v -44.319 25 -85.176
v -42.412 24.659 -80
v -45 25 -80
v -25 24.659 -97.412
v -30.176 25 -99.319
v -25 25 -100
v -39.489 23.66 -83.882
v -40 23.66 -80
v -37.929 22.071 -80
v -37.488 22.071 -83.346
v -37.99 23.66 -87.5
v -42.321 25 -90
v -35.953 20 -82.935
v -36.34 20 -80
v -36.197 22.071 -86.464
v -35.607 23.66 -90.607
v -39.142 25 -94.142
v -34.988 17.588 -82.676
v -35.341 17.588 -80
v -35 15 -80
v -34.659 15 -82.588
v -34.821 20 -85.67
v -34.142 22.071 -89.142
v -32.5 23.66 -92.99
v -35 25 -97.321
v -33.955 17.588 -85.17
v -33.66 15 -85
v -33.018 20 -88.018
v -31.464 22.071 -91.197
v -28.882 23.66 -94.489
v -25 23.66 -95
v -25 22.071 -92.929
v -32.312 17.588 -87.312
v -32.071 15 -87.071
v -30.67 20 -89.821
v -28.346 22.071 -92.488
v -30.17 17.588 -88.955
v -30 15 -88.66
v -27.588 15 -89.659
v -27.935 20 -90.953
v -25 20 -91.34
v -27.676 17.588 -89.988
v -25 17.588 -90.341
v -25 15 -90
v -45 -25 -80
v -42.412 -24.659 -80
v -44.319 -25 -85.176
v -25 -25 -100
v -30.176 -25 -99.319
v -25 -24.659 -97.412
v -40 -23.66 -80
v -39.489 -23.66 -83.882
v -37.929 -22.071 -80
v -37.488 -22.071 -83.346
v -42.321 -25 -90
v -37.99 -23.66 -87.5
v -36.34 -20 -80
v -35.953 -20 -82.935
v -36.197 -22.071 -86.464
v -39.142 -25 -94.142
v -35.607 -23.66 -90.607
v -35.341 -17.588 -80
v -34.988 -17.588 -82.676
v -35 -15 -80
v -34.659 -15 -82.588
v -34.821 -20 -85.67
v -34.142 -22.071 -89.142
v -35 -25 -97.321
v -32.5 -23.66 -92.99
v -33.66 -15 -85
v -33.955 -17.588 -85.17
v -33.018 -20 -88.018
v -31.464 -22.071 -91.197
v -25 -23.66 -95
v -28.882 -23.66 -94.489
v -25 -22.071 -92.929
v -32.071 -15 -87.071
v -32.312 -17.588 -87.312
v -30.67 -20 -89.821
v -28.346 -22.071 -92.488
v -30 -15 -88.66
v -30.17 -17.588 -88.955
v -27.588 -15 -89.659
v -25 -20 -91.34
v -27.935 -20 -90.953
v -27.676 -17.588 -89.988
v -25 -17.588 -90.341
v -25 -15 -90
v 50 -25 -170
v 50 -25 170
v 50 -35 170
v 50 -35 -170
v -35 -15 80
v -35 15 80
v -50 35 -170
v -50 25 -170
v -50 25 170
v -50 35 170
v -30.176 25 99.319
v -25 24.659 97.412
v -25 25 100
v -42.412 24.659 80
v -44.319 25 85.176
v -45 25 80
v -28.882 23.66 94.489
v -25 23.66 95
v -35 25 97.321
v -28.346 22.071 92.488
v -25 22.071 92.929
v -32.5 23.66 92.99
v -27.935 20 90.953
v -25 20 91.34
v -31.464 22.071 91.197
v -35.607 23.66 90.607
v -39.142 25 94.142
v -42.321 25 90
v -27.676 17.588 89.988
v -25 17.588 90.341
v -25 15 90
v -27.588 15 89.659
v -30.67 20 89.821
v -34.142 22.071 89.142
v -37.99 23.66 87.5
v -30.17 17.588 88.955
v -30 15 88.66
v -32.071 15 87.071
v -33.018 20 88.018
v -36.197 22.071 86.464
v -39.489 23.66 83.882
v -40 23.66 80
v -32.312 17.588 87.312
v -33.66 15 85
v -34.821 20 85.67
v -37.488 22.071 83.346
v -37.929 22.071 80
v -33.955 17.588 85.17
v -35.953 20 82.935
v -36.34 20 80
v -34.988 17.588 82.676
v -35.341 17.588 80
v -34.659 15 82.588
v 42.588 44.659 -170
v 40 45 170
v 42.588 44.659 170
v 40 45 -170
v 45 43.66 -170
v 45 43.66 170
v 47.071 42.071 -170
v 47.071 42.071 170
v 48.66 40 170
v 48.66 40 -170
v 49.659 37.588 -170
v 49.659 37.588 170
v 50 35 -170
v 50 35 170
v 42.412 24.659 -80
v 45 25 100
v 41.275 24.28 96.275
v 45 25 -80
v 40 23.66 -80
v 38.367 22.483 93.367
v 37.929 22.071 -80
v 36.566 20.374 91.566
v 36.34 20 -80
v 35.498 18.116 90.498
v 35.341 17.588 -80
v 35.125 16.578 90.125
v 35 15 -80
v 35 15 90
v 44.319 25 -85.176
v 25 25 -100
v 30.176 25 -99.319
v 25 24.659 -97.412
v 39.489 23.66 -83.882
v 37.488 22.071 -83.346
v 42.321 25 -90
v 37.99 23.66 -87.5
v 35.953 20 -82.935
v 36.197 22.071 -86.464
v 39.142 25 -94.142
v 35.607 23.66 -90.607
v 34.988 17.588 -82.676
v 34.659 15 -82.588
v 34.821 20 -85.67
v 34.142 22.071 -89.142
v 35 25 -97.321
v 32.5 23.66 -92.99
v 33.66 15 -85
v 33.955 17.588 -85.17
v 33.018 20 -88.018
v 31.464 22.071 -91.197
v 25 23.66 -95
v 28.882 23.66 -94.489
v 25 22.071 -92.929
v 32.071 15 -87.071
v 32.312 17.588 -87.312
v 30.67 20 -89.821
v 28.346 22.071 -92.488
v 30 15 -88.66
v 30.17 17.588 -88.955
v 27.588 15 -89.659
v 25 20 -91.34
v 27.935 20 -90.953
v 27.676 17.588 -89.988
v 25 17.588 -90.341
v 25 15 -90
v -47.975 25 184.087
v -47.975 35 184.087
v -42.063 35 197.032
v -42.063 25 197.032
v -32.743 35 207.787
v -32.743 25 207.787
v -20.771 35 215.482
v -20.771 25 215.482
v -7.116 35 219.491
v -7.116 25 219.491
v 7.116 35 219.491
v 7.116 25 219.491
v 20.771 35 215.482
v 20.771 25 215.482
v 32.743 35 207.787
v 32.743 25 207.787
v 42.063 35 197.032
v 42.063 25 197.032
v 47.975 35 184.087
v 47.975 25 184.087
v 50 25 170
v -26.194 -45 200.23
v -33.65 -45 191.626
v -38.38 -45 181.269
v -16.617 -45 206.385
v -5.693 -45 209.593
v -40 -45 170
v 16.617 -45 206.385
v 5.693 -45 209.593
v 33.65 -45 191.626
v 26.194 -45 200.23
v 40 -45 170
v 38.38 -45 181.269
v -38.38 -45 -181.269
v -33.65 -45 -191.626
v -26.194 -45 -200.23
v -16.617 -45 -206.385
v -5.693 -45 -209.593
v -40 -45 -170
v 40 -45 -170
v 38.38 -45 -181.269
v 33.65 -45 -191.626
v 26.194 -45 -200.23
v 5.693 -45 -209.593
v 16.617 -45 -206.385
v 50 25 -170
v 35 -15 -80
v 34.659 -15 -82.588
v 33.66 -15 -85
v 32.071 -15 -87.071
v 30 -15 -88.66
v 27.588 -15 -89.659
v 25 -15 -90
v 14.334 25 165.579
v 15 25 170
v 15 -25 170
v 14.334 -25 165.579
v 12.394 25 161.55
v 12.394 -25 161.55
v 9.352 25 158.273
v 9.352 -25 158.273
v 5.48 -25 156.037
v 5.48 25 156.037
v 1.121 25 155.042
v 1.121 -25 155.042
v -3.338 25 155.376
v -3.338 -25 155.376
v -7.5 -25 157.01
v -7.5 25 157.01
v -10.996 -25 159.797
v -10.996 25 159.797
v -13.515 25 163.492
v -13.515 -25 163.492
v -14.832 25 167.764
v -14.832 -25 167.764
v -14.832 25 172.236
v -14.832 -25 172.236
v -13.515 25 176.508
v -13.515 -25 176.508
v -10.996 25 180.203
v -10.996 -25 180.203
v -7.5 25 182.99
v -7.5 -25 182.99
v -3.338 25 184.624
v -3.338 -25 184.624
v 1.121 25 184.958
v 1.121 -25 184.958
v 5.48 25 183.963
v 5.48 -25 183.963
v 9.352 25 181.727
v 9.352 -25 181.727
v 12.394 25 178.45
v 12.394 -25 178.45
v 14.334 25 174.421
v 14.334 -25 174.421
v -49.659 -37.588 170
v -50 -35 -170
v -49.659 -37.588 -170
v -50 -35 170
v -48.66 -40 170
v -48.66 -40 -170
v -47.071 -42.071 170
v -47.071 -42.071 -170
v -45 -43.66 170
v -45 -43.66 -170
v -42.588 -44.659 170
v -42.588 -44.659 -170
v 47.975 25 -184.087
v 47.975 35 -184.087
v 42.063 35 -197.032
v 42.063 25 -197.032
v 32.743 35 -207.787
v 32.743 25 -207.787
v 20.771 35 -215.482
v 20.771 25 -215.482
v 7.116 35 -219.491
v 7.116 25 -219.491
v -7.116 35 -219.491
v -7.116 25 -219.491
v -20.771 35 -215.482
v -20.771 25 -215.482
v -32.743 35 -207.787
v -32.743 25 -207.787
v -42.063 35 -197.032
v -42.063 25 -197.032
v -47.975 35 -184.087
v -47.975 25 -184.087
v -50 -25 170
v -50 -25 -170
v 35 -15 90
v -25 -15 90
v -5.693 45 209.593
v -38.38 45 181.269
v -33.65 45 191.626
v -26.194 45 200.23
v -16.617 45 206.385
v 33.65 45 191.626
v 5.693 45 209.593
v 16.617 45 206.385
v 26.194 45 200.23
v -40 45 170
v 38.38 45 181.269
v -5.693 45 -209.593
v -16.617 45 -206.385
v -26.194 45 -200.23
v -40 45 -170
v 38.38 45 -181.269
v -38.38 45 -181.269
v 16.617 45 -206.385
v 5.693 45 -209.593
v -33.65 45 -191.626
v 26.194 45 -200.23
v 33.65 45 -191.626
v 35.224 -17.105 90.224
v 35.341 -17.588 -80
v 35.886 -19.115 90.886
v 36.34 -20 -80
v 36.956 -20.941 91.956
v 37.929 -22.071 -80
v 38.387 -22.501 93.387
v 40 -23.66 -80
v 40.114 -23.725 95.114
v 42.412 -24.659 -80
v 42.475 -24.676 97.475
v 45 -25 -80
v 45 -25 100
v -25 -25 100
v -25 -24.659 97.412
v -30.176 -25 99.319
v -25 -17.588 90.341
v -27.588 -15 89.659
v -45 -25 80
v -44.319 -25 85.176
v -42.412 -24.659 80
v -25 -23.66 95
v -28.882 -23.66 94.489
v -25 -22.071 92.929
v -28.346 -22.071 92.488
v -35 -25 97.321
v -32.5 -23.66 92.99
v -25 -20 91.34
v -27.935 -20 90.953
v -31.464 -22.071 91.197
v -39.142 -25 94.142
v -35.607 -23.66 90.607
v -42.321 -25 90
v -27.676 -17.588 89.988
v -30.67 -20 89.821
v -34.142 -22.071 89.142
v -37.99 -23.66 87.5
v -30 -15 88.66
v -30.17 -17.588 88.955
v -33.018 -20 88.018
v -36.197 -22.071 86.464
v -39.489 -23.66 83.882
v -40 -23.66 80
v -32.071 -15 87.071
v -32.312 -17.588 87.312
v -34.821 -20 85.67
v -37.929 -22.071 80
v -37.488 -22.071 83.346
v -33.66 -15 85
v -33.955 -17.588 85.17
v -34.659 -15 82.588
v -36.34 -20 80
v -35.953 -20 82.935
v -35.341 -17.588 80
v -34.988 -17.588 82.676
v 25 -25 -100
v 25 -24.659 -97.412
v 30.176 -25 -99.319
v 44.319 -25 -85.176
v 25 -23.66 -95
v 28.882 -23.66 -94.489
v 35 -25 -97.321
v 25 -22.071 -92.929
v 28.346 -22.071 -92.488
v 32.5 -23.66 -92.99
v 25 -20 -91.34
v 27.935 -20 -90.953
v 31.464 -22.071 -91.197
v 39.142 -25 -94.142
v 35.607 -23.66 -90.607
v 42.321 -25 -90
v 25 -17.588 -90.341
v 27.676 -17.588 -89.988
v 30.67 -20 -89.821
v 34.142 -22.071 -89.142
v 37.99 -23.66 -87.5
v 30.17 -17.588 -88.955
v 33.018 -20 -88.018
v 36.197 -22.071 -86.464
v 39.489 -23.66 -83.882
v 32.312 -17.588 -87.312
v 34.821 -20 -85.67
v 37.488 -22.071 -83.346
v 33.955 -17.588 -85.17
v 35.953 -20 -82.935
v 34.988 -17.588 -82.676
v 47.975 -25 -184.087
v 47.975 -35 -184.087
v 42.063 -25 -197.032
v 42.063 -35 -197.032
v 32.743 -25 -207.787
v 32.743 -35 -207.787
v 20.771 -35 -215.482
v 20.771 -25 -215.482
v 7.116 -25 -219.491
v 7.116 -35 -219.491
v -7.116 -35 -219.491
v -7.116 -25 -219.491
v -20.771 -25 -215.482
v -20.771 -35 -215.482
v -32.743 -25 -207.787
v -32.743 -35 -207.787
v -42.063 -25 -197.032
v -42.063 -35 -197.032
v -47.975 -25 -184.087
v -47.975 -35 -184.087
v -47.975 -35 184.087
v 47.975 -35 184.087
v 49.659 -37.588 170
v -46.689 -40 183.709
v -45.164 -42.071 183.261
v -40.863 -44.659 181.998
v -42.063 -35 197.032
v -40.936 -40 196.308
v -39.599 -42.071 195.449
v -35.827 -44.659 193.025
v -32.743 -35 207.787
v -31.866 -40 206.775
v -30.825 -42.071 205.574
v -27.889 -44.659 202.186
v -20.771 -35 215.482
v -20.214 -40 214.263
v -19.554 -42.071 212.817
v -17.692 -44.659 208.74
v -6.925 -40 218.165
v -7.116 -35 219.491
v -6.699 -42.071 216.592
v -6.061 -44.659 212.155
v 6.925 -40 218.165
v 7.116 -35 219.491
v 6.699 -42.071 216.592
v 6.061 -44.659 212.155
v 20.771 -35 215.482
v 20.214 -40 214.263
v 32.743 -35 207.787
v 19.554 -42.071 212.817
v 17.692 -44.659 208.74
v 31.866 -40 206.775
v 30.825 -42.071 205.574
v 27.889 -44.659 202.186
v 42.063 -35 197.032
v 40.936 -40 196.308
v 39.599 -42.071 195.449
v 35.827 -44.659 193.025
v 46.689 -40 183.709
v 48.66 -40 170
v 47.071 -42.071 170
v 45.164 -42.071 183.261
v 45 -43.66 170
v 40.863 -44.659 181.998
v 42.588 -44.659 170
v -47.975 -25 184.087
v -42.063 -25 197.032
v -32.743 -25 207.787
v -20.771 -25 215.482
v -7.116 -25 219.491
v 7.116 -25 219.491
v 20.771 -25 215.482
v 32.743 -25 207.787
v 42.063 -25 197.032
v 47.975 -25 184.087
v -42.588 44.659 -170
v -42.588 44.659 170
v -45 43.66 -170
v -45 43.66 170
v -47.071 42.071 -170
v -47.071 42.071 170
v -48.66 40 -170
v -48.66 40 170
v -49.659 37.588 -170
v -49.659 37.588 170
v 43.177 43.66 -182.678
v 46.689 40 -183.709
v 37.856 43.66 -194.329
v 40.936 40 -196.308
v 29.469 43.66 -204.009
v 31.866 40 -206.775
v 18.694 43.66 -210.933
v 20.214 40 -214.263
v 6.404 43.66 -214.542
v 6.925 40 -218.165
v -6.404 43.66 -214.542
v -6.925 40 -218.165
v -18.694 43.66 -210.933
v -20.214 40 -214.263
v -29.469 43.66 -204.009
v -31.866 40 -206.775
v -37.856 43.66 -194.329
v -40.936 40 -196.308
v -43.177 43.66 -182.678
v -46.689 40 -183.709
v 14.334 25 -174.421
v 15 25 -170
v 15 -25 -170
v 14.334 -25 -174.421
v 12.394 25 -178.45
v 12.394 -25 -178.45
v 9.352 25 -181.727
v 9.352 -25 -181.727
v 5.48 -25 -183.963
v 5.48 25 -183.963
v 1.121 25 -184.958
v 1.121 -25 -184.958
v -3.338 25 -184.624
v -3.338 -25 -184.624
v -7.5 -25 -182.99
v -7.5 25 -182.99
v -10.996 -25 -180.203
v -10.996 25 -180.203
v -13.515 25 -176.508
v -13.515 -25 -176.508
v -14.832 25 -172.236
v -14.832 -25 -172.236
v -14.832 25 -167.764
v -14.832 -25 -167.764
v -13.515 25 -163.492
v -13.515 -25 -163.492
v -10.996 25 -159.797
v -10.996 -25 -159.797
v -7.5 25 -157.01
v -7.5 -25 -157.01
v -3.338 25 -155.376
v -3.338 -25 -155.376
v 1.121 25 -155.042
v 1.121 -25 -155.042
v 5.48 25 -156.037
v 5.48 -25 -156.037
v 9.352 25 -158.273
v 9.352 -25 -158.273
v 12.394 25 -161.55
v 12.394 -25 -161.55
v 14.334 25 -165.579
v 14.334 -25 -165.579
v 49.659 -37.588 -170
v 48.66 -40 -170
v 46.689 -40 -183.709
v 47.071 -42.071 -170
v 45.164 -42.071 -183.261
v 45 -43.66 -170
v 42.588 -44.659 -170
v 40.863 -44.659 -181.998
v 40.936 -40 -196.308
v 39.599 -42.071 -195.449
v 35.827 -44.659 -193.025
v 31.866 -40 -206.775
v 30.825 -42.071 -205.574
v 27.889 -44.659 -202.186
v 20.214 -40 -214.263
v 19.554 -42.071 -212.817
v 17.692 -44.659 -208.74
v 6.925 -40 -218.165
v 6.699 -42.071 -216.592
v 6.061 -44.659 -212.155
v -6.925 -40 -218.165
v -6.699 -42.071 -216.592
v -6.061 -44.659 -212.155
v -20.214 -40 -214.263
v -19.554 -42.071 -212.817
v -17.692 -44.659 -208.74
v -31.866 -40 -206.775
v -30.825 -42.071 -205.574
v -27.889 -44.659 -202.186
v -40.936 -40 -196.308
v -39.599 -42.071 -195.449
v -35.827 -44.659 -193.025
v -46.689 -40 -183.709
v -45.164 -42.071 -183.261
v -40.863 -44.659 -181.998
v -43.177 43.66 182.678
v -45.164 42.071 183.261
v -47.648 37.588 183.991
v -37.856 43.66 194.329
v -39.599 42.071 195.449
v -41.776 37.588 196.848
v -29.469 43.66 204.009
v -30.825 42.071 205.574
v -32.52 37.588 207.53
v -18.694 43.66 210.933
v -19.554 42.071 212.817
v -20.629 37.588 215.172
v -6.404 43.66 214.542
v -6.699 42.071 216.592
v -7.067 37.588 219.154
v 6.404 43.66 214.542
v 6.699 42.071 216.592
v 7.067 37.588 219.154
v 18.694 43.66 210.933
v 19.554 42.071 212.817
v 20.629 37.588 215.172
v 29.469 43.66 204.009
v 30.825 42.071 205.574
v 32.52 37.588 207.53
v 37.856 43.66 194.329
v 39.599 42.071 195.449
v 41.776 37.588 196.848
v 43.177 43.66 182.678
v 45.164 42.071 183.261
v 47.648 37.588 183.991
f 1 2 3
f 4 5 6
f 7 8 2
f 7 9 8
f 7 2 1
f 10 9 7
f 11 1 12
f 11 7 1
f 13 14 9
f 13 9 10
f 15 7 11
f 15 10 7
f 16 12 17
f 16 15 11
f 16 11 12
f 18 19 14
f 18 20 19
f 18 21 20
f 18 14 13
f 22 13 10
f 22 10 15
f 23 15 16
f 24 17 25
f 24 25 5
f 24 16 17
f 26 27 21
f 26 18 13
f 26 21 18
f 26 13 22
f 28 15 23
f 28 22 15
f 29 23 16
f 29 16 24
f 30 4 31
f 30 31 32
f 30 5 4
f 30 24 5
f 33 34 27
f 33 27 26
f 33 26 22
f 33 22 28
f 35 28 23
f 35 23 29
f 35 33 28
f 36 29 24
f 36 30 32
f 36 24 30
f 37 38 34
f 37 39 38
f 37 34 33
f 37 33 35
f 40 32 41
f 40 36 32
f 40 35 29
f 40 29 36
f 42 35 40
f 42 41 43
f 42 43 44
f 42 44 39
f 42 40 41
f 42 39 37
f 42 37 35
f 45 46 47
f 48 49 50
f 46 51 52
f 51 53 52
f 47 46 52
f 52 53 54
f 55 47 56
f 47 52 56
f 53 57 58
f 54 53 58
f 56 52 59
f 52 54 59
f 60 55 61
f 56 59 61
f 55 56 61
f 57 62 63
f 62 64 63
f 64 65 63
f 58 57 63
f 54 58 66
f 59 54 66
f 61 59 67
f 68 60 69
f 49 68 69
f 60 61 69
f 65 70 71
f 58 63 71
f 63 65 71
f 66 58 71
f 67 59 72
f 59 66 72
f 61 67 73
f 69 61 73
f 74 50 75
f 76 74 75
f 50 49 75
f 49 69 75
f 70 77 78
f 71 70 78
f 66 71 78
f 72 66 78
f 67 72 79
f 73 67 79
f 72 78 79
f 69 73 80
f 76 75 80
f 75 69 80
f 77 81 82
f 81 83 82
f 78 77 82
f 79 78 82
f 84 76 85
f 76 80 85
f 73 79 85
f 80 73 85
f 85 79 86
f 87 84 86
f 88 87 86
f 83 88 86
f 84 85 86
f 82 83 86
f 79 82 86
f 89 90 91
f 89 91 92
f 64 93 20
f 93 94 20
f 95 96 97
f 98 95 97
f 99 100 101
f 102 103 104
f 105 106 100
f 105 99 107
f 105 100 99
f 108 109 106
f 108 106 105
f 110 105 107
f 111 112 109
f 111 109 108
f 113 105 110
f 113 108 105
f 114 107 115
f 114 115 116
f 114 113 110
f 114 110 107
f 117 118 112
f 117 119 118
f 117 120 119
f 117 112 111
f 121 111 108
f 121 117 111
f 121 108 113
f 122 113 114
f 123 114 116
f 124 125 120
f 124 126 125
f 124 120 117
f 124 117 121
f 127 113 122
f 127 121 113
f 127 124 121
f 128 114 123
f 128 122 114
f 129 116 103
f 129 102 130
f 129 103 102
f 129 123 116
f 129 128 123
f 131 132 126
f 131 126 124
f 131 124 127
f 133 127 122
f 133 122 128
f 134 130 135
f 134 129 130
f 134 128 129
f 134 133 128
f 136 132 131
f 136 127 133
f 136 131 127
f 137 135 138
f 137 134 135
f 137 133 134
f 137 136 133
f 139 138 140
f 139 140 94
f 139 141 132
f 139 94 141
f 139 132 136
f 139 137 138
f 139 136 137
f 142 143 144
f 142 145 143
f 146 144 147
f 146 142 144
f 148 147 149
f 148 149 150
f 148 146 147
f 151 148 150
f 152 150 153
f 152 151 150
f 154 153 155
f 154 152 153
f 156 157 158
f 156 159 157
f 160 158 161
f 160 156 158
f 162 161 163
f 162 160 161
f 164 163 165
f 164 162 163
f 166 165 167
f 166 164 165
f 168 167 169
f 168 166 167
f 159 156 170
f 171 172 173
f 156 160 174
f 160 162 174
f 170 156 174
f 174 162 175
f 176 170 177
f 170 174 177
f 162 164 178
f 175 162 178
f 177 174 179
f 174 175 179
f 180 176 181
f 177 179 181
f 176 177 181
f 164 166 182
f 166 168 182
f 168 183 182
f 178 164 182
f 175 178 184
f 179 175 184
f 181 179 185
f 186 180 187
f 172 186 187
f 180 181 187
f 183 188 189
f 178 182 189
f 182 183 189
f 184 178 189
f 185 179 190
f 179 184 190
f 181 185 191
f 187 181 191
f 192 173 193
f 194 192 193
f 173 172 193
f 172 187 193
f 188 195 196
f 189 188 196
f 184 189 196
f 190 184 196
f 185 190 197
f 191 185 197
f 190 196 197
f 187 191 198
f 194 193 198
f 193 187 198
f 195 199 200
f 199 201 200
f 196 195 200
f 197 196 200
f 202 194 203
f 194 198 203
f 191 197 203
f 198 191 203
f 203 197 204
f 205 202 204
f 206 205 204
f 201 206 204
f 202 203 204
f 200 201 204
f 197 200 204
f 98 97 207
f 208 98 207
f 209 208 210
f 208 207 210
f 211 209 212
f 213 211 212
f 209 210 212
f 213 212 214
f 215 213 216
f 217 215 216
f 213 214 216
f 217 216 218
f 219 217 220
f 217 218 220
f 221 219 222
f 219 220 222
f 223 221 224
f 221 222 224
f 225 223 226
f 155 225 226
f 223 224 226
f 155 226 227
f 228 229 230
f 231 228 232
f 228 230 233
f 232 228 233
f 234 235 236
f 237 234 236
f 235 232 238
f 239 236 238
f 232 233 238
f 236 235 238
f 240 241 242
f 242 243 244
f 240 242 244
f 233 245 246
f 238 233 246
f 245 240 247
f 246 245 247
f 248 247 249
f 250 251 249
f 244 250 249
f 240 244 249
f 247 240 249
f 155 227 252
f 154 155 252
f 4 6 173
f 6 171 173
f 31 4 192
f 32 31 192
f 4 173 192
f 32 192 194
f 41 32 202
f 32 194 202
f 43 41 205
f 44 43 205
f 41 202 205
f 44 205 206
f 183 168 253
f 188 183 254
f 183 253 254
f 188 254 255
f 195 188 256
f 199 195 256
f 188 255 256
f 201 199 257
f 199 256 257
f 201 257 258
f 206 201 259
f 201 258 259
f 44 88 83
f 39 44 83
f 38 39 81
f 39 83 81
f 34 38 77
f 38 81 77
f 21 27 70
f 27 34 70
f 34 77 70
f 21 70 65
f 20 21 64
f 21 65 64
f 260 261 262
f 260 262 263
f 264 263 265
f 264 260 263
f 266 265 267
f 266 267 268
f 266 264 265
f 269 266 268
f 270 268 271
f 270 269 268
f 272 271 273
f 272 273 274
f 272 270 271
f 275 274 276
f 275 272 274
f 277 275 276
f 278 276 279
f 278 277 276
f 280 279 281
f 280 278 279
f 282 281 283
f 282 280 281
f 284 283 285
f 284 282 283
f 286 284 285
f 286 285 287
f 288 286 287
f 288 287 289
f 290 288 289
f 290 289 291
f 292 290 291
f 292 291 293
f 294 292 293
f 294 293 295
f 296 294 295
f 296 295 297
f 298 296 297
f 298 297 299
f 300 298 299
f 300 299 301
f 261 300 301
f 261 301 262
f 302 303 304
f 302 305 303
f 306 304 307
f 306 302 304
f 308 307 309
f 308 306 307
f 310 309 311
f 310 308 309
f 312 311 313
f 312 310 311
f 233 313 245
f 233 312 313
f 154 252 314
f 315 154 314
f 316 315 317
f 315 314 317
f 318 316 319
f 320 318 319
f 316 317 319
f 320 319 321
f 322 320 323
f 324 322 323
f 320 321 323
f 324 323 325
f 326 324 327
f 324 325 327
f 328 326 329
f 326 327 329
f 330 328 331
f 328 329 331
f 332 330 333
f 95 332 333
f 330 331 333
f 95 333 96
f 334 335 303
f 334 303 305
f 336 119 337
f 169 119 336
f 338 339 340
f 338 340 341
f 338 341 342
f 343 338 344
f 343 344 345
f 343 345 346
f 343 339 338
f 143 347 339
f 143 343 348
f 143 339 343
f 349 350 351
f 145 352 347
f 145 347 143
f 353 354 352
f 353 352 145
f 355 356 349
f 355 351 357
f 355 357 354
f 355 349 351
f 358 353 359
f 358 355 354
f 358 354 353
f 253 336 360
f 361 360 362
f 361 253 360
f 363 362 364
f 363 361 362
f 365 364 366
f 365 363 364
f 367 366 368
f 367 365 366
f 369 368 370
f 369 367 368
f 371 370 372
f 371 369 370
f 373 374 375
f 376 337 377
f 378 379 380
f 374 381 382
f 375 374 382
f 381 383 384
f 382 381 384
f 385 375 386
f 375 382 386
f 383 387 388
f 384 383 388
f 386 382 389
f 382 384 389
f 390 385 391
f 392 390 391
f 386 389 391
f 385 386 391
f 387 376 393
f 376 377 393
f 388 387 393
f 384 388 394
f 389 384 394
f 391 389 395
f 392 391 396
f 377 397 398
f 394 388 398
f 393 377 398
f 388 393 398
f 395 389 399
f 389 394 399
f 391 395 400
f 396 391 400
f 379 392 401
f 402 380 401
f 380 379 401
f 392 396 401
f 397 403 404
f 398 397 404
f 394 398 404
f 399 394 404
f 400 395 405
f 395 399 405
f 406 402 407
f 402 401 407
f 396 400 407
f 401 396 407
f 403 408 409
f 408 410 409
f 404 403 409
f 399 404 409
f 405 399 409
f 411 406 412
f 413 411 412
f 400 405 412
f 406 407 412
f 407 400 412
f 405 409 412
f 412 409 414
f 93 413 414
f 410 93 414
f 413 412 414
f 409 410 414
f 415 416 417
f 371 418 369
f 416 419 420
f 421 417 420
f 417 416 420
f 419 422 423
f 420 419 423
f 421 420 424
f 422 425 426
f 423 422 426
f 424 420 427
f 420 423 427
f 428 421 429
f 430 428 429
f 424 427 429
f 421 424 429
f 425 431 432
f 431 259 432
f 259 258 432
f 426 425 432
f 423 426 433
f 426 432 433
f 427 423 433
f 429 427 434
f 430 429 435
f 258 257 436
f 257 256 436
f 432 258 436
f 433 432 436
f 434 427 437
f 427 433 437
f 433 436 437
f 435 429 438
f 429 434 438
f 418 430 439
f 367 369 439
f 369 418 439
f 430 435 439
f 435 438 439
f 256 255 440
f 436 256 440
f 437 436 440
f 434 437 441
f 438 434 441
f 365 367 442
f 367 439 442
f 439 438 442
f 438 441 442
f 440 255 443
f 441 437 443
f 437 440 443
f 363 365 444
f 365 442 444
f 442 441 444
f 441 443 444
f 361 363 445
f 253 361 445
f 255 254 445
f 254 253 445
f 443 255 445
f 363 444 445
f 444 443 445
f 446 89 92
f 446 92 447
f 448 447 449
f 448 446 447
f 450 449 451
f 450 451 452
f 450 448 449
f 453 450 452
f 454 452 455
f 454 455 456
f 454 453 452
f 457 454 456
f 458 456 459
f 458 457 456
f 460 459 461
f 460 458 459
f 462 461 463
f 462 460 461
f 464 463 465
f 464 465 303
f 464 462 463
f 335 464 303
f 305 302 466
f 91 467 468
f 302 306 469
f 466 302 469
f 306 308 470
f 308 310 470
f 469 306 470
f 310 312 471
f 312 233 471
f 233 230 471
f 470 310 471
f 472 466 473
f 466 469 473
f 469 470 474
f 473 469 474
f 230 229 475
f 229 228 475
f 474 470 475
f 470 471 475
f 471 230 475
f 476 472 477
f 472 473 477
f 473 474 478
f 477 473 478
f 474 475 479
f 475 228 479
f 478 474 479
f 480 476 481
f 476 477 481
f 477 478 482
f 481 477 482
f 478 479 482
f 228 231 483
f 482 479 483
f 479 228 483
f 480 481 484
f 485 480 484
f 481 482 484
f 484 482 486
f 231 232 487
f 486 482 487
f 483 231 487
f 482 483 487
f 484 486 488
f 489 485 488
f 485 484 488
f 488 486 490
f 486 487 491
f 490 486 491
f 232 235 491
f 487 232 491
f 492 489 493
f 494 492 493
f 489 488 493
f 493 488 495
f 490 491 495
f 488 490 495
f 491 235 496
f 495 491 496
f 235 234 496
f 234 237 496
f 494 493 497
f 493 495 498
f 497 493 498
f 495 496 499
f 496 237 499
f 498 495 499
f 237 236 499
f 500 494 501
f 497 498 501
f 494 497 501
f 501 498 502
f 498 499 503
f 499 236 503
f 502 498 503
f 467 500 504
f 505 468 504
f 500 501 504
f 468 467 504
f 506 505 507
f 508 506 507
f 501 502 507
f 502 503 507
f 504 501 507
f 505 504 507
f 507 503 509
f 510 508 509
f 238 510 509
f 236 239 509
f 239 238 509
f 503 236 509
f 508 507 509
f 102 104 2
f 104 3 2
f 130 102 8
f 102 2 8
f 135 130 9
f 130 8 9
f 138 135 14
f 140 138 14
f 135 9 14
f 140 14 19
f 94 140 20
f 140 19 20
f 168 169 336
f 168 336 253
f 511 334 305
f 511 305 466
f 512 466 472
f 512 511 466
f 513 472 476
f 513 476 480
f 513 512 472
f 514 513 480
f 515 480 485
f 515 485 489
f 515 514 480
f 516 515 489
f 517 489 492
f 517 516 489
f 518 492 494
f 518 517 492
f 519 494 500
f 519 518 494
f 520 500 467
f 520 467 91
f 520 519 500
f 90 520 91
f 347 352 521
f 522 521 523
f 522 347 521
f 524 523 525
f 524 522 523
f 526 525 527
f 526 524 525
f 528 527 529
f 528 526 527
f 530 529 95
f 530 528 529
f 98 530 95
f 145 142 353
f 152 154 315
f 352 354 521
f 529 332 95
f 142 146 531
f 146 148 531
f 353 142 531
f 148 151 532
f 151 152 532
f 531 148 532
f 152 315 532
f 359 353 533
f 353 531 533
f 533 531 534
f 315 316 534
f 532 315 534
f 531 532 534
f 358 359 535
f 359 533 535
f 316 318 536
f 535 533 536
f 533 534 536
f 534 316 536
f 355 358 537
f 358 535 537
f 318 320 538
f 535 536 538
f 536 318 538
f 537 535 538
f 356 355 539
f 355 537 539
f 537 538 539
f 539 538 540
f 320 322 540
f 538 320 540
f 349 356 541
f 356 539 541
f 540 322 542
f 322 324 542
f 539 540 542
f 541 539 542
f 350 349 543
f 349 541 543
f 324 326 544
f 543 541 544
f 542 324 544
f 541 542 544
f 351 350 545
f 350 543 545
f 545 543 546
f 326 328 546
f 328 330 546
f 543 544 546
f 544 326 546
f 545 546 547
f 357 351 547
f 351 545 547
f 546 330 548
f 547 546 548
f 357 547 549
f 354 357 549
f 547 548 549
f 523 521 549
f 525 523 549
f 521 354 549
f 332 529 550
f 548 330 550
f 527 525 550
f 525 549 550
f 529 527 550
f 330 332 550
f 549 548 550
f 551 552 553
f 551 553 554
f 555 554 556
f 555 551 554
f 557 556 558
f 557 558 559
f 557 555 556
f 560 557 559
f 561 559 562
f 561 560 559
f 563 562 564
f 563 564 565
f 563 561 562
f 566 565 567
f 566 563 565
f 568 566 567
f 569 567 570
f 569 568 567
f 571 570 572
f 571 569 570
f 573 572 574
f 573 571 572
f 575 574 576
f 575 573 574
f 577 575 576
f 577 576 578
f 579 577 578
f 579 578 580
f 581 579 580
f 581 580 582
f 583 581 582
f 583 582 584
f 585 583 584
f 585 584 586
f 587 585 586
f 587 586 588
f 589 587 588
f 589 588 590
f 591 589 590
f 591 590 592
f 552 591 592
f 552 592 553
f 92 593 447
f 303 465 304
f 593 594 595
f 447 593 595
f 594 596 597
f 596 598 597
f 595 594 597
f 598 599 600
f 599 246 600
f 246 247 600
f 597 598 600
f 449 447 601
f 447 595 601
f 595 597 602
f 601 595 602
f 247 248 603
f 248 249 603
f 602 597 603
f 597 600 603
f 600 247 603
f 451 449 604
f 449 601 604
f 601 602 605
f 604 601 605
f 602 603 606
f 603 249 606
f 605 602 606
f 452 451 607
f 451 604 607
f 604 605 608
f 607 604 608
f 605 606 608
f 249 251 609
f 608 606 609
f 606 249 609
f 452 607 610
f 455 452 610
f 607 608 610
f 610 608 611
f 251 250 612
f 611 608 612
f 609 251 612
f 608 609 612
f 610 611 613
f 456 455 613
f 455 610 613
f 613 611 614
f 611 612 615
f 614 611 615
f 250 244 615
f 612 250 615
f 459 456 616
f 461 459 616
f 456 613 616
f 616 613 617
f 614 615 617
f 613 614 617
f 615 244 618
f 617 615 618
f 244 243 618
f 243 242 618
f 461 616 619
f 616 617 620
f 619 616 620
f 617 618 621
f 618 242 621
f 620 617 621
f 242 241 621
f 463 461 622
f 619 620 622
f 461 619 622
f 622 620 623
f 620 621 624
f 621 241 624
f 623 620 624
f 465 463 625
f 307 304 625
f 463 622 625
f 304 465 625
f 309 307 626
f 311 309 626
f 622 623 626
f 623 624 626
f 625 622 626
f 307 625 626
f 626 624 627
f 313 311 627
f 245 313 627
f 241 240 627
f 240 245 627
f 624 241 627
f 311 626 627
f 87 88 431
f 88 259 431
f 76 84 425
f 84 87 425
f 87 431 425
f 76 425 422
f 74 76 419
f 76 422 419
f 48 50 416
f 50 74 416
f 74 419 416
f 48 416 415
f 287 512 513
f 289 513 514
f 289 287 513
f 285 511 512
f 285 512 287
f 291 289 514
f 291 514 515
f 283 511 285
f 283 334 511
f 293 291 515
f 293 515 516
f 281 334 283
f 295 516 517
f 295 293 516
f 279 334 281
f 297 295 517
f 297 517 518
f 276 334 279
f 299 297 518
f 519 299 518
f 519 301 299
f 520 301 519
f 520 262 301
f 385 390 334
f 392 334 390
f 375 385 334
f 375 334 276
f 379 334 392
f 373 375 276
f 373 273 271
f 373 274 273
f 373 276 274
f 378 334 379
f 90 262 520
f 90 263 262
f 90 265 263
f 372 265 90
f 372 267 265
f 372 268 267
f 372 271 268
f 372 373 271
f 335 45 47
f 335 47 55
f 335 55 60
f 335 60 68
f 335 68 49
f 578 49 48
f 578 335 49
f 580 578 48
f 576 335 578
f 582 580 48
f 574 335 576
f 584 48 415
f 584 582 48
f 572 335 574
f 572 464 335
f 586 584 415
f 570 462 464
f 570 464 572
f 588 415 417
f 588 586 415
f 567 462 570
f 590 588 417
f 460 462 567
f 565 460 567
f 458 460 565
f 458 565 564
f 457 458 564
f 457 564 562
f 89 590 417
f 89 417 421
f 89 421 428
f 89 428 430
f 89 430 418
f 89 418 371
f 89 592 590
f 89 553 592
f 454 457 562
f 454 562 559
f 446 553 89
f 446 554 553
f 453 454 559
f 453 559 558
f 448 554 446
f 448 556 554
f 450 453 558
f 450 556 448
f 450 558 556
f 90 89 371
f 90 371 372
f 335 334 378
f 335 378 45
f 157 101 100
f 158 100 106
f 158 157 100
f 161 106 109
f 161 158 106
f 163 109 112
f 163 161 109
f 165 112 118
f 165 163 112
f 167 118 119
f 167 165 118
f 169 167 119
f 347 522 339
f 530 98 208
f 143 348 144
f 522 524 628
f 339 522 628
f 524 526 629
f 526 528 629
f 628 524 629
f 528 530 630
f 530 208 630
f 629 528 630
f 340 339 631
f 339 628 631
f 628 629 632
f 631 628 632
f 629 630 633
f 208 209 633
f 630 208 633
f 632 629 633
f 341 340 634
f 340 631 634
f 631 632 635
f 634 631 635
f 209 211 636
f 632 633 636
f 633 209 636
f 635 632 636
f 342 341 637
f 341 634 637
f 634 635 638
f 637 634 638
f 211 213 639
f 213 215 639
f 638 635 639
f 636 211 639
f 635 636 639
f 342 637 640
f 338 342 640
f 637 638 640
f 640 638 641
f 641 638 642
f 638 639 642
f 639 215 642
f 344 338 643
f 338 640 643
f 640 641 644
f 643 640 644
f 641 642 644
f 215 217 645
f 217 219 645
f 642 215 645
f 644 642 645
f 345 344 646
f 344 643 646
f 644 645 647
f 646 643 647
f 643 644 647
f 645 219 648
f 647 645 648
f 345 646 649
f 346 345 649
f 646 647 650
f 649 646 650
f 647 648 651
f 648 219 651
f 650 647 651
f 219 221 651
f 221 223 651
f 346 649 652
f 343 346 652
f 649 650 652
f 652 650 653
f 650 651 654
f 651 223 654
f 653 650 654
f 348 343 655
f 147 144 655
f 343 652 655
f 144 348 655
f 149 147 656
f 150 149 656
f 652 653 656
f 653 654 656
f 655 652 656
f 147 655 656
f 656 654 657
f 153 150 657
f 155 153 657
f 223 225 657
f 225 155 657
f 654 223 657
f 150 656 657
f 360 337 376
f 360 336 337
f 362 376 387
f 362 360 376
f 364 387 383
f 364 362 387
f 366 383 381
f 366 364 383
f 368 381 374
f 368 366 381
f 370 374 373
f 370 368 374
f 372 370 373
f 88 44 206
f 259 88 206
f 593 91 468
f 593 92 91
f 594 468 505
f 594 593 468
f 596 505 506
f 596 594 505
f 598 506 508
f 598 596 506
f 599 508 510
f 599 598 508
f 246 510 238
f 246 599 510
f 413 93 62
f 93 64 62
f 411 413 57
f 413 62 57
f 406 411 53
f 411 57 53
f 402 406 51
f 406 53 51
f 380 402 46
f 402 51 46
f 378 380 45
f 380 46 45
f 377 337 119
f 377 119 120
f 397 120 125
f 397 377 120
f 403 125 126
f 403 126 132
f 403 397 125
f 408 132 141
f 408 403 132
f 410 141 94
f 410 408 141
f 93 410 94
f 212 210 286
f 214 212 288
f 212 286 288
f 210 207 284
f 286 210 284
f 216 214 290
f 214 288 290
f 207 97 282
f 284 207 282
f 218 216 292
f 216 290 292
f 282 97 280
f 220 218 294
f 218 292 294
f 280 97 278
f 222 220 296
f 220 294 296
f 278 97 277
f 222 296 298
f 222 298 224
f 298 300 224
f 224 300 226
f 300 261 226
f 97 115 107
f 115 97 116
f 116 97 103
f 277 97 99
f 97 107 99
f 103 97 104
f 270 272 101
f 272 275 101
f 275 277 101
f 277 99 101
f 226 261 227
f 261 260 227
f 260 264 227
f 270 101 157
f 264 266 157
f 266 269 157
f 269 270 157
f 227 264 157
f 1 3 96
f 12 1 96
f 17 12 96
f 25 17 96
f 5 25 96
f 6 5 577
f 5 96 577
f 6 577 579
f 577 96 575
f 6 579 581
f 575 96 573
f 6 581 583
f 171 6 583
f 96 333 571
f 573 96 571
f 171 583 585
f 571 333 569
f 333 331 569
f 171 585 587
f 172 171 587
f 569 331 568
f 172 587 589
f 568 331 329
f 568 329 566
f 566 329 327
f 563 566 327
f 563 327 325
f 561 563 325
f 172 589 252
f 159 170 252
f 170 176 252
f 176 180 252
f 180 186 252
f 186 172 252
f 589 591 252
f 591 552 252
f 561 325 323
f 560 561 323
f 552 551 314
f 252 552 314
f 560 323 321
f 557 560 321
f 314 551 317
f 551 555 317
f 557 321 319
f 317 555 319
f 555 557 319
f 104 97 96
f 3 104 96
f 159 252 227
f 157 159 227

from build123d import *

# Parameters (mm, degrees)
EXTRUDE_1_DEPTH = 20
EXTRUDE_2_DEPTH = 20
SKETCH_3_R      = 15
SKETCH_3_W      = 70
SKETCH_3_H      = 180
EXTRUDE_3_DEPTH = 90
FILLET_1_R      = 10
FILLET_2_R      = 10


with BuildPart() as part:
    # 草圖1 → 填料-伸長1 (new body)
    with BuildSketch(Plane(origin=(0, 25, 0), x_dir=(1, 0, 0), z_dir=(0, 1, 0))):
        with BuildLine():
            Line((-50, 170), (-50, -170))
            ThreePointArc((-50, -170), (0, -220), (50, -170))
            Line((50, -170), (50, 170))
            ThreePointArc((50, 170), (0, 220), (-50, 170))
        make_face()
    extrude(amount=EXTRUDE_1_DEPTH)



with BuildPart() as body_2:
    # 草圖2 → 填料-伸長2 (new body)
    with BuildSketch(Plane(origin=(0, -25, 0), x_dir=(1, 0, 0), z_dir=(0, 1, 0))):
        with BuildLine():
            Line((50, -170), (50, 170))
            ThreePointArc((50, 170), (0, 220), (-50, 170))
            Line((-50, 170), (-50, -170))
            ThreePointArc((-50, -170), (0, -220), (50, -170))
        make_face()
    extrude(amount=-EXTRUDE_2_DEPTH)


with BuildPart() as part_1:
    add(part.part)

    add(body_2.part)  # 填料-伸長3 merges body 2
    # 草圖3 → 填料-伸長3 (add)
    with BuildSketch(Plane(origin=(0, 45, 0), x_dir=(1, 0, 0), z_dir=(0, 1, 0))):
        with Locations((0, 170)):
            Circle(SKETCH_3_R)
        with Locations((0, -170)):
            Circle(SKETCH_3_R)
        Rectangle(SKETCH_3_W, SKETCH_3_H)
    extrude(amount=-EXTRUDE_3_DEPTH)

    # 圓角1
    fillet_1_edges = [part_1.edges().sort_by_distance(p)[0] for p in [
        (0, 45, -220),
        (-50, 45, 0),
        (0, -45, -220),
        (50, -45, 0),
        (0, -45, 220),
        (-50, -45, 0),
        (0, 45, 220),
        (50, 45, 0),
    ]]
    fillet(fillet_1_edges, radius=FILLET_1_R)

    # 圓角2
    fillet_2_edges = [part_1.edges().sort_by_distance(p)[0] for p in [
        (35, -25, 0),
        (35, 0, -90),
        (0, -25, 90),
        (-35, -25, 0),
        (-35, 0, 90),
        (0, -25, -90),
        (-35, 0, -90),
        (35, 25, 0),
        (0, 25, 90),
        (-35, 25, 0),
        (0, 25, -90),
    ]]
    fillet(fillet_2_edges, radius=FILLET_2_R)


solid = part_1.part
